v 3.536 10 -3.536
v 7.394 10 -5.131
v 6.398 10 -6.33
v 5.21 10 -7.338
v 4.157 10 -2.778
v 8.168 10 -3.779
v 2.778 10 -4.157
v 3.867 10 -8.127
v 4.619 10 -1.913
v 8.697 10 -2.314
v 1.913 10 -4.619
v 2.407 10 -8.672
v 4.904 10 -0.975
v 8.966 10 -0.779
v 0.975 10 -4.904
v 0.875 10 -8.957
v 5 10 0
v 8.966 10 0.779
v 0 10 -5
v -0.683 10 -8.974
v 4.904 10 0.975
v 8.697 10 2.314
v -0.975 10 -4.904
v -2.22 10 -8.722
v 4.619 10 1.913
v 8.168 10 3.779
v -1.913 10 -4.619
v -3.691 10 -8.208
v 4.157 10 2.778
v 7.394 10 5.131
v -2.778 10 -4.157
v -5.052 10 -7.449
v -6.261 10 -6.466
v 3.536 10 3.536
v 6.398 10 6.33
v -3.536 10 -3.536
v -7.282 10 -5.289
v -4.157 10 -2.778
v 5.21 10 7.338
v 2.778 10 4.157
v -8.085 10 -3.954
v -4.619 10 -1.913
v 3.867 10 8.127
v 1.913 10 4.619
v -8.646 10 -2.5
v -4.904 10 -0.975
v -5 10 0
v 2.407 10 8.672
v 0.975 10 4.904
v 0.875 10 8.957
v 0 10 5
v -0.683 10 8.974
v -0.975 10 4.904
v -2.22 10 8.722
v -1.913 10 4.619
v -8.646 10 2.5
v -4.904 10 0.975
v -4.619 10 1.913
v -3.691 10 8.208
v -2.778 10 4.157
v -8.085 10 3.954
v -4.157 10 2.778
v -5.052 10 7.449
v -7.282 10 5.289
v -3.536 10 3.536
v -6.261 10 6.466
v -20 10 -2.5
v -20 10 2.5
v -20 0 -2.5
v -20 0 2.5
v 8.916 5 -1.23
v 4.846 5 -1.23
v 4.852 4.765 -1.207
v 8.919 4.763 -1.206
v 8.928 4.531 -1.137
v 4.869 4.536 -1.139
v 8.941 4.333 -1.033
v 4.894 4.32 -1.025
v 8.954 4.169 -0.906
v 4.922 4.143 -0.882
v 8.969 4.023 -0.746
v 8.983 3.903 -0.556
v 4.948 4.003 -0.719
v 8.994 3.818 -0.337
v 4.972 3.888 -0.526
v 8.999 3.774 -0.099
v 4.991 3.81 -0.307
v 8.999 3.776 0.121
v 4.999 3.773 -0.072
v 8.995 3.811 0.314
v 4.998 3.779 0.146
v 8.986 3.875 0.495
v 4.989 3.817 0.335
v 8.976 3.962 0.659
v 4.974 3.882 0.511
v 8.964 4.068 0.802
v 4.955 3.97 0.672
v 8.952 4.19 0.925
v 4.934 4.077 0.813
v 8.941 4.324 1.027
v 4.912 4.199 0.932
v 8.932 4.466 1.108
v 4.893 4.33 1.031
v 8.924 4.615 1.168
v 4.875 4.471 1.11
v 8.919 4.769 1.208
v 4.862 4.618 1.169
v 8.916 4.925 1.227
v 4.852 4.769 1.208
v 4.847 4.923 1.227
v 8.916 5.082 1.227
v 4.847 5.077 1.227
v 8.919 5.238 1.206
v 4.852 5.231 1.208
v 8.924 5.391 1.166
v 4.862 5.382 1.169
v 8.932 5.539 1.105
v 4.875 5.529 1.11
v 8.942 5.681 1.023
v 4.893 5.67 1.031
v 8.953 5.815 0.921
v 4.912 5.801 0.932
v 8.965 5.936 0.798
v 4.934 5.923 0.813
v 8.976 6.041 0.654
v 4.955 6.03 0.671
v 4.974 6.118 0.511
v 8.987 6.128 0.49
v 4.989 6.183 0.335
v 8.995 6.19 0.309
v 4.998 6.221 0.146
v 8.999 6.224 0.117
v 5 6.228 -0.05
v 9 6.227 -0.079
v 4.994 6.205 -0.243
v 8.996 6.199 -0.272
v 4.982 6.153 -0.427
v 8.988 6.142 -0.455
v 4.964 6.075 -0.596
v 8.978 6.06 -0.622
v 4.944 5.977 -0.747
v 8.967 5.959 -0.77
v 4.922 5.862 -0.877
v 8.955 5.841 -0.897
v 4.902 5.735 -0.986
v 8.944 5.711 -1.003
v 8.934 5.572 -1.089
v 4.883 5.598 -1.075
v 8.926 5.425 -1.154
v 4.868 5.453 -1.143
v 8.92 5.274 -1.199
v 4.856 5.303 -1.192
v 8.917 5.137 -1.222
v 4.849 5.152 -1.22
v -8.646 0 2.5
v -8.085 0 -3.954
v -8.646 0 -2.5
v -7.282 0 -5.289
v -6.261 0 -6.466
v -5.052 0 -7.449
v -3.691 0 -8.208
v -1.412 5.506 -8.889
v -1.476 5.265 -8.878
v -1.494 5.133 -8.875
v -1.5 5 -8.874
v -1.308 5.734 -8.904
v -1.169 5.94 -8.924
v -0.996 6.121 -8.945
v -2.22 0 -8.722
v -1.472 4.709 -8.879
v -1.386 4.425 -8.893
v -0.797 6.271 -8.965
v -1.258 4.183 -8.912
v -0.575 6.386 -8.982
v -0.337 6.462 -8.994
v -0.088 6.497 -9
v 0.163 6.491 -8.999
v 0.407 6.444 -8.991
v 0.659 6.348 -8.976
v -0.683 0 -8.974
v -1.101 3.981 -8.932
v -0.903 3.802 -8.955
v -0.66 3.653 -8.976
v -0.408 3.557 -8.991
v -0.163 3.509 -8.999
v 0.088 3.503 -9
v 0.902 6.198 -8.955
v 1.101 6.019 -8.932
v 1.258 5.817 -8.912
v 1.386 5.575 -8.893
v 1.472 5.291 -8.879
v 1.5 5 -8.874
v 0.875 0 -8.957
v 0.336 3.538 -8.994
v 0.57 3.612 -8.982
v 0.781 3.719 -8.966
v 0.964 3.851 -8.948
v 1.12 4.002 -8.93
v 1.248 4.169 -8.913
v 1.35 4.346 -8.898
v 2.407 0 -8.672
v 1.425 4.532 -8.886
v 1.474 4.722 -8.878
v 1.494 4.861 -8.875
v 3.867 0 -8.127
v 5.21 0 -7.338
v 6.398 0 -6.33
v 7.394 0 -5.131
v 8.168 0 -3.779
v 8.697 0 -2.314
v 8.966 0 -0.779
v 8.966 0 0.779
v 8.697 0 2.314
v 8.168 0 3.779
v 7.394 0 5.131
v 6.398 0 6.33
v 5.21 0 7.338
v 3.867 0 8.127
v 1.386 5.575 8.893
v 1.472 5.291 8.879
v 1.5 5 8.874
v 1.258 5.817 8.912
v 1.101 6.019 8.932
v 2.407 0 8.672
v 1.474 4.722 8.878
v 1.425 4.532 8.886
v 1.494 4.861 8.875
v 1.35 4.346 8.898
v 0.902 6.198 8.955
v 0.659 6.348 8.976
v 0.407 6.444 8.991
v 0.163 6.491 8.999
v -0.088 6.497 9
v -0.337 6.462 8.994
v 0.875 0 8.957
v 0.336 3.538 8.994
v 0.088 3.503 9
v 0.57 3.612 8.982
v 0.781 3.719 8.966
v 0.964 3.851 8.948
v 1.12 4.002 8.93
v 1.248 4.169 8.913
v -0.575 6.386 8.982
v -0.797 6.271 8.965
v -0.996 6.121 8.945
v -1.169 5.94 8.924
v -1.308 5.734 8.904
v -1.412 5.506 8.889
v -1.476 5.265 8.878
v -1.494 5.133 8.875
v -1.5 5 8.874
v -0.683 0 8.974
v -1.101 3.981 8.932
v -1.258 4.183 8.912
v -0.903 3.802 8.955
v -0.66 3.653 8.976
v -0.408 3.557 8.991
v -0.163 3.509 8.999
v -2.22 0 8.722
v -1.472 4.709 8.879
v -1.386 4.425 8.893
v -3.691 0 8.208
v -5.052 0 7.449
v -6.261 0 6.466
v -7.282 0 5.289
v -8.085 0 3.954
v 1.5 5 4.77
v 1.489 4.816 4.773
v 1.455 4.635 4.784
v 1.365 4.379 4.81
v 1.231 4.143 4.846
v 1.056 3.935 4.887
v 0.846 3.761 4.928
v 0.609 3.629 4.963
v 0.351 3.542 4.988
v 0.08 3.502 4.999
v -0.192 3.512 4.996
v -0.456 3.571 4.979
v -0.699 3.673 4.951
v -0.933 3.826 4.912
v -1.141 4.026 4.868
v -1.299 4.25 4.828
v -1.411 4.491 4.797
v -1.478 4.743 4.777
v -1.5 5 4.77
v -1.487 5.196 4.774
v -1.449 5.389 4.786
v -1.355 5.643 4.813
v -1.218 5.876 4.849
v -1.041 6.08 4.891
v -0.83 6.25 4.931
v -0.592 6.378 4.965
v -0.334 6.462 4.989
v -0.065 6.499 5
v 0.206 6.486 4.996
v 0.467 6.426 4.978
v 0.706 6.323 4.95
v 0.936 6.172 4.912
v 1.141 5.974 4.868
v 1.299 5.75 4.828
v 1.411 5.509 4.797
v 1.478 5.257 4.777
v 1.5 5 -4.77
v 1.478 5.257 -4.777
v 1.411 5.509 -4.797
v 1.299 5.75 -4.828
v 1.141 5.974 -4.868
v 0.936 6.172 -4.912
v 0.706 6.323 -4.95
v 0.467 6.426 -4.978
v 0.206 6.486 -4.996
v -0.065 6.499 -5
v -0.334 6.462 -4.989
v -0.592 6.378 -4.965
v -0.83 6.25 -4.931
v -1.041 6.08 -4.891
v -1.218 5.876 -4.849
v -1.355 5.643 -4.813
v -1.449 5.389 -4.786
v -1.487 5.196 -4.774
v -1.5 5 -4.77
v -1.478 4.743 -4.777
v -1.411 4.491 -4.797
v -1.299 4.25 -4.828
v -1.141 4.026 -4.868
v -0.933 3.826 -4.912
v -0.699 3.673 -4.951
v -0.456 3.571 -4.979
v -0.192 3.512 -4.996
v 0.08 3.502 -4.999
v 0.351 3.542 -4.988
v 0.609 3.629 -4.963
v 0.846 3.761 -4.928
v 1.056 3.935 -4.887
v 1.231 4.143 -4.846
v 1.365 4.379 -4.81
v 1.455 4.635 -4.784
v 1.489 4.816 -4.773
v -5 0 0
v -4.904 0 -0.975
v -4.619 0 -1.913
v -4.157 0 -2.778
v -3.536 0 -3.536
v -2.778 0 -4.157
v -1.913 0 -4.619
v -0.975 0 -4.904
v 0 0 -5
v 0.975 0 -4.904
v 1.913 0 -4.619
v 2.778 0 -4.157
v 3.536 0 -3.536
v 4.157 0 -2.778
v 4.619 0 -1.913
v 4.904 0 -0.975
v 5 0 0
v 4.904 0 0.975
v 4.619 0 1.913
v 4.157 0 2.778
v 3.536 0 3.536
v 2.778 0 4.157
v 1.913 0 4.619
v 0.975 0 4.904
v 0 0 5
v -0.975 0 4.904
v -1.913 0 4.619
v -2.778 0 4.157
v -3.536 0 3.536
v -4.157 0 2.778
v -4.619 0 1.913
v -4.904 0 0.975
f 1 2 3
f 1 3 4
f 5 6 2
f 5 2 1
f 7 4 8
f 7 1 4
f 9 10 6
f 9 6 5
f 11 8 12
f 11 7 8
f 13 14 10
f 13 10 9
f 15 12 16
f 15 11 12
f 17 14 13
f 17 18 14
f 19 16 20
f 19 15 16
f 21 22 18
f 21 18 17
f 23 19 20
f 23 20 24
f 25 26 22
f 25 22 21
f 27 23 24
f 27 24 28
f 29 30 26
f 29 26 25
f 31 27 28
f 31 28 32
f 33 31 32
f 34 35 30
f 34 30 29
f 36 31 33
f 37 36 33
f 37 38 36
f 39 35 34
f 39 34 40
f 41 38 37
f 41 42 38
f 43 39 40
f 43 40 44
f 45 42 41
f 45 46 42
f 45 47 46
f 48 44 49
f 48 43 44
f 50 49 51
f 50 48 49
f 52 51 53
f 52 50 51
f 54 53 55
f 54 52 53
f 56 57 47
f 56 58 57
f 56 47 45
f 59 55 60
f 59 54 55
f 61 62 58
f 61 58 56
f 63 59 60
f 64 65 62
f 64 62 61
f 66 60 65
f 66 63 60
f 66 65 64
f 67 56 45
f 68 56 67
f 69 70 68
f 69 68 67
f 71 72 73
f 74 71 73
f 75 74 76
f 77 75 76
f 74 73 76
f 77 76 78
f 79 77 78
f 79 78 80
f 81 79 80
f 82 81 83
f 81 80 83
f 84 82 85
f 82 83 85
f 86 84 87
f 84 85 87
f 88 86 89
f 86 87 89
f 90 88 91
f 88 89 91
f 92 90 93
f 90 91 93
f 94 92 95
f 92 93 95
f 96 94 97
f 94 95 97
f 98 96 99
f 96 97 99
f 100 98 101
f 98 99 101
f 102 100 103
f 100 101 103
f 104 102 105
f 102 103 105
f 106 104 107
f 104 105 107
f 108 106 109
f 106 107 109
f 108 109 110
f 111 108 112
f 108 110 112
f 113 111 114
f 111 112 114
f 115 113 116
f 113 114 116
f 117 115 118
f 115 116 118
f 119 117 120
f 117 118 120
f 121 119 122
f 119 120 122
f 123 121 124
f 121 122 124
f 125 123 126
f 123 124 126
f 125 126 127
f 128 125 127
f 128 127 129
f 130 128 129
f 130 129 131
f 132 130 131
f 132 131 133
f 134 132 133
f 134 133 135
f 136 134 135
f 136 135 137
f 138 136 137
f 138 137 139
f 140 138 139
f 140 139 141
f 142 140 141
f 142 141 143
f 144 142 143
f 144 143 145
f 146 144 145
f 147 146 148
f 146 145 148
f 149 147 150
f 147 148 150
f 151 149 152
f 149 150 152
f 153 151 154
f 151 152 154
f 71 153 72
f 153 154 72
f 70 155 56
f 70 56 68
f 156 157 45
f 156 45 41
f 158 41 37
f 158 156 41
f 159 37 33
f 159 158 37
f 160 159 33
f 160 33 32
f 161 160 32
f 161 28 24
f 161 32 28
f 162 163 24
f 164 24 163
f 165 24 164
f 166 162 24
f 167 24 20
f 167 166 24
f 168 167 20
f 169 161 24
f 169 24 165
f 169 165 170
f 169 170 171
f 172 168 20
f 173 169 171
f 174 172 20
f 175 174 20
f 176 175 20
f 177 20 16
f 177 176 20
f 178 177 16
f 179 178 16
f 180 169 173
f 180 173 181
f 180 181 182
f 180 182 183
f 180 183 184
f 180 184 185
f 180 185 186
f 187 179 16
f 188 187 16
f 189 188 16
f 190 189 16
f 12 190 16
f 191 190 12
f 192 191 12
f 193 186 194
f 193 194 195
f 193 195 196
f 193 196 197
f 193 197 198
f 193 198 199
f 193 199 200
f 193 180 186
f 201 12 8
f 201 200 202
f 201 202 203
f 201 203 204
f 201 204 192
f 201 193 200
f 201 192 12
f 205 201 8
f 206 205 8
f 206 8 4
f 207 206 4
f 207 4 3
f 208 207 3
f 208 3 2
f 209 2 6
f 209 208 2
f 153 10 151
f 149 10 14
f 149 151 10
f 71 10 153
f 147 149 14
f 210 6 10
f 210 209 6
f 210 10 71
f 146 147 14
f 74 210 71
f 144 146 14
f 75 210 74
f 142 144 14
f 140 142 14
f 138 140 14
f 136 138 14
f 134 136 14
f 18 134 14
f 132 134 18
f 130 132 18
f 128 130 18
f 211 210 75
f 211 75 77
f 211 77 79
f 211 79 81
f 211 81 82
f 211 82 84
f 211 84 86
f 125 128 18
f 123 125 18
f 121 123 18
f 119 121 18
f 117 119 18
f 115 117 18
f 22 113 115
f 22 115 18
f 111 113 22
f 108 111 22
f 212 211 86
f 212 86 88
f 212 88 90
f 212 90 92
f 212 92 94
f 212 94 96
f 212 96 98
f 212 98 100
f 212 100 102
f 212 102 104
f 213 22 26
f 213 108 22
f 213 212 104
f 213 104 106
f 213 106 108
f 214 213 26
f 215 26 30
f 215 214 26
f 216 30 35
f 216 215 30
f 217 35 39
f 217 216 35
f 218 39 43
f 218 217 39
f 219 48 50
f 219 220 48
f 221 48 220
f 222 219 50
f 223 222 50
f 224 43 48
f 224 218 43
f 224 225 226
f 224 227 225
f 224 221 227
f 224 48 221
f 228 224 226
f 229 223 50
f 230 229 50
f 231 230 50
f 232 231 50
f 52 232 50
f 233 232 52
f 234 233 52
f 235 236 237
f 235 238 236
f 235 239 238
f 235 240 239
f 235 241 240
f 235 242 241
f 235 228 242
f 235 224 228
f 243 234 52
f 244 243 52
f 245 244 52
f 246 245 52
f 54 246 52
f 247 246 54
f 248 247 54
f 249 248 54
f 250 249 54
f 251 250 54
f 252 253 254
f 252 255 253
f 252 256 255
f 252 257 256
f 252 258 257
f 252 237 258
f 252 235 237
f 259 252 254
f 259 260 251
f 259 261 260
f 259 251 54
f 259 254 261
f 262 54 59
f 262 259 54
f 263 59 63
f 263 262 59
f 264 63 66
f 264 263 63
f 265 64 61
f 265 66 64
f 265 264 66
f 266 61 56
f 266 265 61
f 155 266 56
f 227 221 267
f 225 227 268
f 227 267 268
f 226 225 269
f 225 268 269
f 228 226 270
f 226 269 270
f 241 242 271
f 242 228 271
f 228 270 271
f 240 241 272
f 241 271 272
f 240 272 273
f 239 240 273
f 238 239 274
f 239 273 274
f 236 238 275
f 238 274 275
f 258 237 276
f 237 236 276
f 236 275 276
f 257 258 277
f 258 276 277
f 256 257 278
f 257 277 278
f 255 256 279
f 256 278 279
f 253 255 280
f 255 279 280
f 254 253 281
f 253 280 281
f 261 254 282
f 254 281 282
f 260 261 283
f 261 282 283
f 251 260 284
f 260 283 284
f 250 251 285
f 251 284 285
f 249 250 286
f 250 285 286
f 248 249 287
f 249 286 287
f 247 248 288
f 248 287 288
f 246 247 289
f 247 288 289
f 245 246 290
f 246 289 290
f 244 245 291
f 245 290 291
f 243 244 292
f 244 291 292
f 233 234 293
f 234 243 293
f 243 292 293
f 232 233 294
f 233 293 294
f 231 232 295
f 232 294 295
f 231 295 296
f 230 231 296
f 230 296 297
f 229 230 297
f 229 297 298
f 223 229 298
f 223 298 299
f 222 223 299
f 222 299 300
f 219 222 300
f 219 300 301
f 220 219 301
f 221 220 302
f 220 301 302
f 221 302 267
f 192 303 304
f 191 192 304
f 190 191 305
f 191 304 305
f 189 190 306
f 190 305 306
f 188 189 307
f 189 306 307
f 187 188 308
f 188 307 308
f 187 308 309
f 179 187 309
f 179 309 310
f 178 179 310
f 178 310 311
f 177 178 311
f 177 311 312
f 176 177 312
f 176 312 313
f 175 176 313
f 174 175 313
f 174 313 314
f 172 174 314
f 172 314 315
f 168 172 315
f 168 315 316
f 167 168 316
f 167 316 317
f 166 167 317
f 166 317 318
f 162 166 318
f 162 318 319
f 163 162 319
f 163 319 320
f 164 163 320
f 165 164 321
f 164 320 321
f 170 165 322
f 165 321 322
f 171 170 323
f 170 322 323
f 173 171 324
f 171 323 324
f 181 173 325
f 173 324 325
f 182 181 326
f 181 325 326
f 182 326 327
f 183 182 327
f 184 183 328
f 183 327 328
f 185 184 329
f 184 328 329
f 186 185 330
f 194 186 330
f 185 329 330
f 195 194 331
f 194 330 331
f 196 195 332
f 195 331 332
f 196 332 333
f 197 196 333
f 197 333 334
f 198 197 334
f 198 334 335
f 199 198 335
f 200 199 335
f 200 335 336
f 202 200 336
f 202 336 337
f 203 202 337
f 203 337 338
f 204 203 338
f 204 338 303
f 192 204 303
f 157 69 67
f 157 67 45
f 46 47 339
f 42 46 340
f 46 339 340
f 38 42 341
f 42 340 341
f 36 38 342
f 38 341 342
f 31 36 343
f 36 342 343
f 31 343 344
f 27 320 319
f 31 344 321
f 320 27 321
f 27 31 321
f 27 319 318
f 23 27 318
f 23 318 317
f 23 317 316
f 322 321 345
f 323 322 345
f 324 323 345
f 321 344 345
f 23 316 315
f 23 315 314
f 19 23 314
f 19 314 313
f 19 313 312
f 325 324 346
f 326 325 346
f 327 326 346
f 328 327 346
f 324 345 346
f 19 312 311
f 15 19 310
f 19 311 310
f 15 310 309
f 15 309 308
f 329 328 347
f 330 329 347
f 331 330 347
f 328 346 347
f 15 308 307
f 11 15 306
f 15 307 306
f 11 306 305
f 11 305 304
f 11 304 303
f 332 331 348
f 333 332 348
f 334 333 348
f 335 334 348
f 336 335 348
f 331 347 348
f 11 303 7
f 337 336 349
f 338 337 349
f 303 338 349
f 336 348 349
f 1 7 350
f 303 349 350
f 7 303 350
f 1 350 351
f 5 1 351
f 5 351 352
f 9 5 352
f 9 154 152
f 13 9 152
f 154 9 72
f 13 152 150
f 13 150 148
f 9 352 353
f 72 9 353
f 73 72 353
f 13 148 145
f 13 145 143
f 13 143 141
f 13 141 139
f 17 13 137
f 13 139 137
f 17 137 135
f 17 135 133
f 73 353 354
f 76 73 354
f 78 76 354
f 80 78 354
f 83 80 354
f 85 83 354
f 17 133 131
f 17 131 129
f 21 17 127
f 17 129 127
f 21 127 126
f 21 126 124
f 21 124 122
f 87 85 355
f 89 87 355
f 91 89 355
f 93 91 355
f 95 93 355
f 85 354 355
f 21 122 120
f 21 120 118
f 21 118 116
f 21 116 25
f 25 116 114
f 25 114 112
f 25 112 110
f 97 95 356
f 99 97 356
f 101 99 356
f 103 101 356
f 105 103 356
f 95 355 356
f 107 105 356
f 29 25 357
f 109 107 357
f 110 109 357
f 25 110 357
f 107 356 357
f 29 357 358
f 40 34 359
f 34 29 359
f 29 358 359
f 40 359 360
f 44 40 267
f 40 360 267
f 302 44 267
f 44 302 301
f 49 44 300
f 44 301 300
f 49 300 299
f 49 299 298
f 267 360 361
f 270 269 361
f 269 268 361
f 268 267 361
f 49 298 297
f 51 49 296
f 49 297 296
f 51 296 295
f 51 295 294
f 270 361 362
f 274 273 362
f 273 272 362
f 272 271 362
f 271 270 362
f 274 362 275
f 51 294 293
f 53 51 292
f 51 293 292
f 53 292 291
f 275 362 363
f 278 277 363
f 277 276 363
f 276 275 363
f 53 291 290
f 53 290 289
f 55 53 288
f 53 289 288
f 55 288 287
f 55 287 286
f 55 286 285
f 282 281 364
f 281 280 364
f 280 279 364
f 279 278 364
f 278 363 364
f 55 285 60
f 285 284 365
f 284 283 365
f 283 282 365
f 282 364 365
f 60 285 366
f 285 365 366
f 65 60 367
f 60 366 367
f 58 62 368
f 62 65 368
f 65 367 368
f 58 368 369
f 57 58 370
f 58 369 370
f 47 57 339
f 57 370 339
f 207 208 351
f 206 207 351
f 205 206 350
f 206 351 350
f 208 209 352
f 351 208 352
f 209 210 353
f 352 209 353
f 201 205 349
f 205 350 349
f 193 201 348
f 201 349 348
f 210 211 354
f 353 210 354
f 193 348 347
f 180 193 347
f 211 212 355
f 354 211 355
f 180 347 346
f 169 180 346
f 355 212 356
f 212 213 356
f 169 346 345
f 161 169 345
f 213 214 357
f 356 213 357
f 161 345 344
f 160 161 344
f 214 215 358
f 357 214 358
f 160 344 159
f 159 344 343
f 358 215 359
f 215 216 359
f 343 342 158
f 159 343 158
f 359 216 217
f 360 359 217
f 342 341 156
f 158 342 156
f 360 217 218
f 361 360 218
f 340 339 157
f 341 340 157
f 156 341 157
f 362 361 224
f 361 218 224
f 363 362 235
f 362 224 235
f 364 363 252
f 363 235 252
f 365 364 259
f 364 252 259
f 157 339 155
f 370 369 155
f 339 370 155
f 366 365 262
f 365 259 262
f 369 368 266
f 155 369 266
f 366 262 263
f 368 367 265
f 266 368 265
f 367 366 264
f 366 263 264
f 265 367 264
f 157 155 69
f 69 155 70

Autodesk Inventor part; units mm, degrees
ref_plane "YZ Plane" through (0, 0, 0) normal (1, 0, 0) x (0, 1, 0)
ref_plane "XZ Plane" through (0, 0, 0) normal (0, 1, 0) x (-1, 0, 0)
sketch "Эскиз1" plane through (0, 0, 0) normal (0, 1, 0) x (-1, 0, 0)
  circle A0 centre (0, 0) radius 5
  circle A1 centre (0, 0) radius 9
  line L0 (0, 0) -> (0, 2.5)
  line L1 (0, 2.5) -> (20, 2.5)
  line L2 (20, 2.5) -> (20, -2.5)
  line L3 (20, -2.5) -> (0, -2.5)
  point P0 (8.6458, 2.5)
  point P1 (8.6458, -2.5)
  dimension "d0" = 10
  dimension "d1" = 18
  dimension "d2" = 2.5
  dimension "d3" = 20
  dimension "d4" = 5
extrude "Выдавливание1" add sketch "Эскиз1" along normal blind 10 contours A0 L1 A1 L3 | A0 L3 A1 L1 | L1 L2 L3 A1
sketch "Эскиз2" plane through (-20, 0, 2.5) normal (0, 0, 1) x (1, 0, 0)
  line L0 (0, 0) -> (0, 10) projected
  line L1 (0, 5) -> (20, 5)
  circle A0 centre (20, 5) radius 1.5
  point P0 (20, 0)
  dimension "d7" = 3
extrude "Выдавливание2" cut sketch "Эскиз2" along normal mid plane 35.5
thread "Резьба1" size "M3x0.5" class "6H" standard "ISO Metric profile" full length
ref_plane "РабПлоскость1" through (10, 0, -2.5) normal (-1, 0, 0) x (0, 0, 1)
sketch "Эскиз3" plane through (0, 0, 0) normal (0, -1, 0) x (1, 0, 0)
  point P0 (0, 0)
sketch "Эскиз4" plane through (10, 0, -2.5) normal (-1, 0, 0) x (0, 0, 1)
  line L0 (2.5, 0) -> (2.5, 5)
  circle A0 centre (2.5, 5) radius 1.5
  dimension "d13" = 3
hole "Отверстие1" at (10, 5, 0) direction (-1, 0, 0) diameter 2.459 depth 8.8 thread size "M3x0.5" class "6H" standard "ISO Metric profile"
properties part number "Стопор"
